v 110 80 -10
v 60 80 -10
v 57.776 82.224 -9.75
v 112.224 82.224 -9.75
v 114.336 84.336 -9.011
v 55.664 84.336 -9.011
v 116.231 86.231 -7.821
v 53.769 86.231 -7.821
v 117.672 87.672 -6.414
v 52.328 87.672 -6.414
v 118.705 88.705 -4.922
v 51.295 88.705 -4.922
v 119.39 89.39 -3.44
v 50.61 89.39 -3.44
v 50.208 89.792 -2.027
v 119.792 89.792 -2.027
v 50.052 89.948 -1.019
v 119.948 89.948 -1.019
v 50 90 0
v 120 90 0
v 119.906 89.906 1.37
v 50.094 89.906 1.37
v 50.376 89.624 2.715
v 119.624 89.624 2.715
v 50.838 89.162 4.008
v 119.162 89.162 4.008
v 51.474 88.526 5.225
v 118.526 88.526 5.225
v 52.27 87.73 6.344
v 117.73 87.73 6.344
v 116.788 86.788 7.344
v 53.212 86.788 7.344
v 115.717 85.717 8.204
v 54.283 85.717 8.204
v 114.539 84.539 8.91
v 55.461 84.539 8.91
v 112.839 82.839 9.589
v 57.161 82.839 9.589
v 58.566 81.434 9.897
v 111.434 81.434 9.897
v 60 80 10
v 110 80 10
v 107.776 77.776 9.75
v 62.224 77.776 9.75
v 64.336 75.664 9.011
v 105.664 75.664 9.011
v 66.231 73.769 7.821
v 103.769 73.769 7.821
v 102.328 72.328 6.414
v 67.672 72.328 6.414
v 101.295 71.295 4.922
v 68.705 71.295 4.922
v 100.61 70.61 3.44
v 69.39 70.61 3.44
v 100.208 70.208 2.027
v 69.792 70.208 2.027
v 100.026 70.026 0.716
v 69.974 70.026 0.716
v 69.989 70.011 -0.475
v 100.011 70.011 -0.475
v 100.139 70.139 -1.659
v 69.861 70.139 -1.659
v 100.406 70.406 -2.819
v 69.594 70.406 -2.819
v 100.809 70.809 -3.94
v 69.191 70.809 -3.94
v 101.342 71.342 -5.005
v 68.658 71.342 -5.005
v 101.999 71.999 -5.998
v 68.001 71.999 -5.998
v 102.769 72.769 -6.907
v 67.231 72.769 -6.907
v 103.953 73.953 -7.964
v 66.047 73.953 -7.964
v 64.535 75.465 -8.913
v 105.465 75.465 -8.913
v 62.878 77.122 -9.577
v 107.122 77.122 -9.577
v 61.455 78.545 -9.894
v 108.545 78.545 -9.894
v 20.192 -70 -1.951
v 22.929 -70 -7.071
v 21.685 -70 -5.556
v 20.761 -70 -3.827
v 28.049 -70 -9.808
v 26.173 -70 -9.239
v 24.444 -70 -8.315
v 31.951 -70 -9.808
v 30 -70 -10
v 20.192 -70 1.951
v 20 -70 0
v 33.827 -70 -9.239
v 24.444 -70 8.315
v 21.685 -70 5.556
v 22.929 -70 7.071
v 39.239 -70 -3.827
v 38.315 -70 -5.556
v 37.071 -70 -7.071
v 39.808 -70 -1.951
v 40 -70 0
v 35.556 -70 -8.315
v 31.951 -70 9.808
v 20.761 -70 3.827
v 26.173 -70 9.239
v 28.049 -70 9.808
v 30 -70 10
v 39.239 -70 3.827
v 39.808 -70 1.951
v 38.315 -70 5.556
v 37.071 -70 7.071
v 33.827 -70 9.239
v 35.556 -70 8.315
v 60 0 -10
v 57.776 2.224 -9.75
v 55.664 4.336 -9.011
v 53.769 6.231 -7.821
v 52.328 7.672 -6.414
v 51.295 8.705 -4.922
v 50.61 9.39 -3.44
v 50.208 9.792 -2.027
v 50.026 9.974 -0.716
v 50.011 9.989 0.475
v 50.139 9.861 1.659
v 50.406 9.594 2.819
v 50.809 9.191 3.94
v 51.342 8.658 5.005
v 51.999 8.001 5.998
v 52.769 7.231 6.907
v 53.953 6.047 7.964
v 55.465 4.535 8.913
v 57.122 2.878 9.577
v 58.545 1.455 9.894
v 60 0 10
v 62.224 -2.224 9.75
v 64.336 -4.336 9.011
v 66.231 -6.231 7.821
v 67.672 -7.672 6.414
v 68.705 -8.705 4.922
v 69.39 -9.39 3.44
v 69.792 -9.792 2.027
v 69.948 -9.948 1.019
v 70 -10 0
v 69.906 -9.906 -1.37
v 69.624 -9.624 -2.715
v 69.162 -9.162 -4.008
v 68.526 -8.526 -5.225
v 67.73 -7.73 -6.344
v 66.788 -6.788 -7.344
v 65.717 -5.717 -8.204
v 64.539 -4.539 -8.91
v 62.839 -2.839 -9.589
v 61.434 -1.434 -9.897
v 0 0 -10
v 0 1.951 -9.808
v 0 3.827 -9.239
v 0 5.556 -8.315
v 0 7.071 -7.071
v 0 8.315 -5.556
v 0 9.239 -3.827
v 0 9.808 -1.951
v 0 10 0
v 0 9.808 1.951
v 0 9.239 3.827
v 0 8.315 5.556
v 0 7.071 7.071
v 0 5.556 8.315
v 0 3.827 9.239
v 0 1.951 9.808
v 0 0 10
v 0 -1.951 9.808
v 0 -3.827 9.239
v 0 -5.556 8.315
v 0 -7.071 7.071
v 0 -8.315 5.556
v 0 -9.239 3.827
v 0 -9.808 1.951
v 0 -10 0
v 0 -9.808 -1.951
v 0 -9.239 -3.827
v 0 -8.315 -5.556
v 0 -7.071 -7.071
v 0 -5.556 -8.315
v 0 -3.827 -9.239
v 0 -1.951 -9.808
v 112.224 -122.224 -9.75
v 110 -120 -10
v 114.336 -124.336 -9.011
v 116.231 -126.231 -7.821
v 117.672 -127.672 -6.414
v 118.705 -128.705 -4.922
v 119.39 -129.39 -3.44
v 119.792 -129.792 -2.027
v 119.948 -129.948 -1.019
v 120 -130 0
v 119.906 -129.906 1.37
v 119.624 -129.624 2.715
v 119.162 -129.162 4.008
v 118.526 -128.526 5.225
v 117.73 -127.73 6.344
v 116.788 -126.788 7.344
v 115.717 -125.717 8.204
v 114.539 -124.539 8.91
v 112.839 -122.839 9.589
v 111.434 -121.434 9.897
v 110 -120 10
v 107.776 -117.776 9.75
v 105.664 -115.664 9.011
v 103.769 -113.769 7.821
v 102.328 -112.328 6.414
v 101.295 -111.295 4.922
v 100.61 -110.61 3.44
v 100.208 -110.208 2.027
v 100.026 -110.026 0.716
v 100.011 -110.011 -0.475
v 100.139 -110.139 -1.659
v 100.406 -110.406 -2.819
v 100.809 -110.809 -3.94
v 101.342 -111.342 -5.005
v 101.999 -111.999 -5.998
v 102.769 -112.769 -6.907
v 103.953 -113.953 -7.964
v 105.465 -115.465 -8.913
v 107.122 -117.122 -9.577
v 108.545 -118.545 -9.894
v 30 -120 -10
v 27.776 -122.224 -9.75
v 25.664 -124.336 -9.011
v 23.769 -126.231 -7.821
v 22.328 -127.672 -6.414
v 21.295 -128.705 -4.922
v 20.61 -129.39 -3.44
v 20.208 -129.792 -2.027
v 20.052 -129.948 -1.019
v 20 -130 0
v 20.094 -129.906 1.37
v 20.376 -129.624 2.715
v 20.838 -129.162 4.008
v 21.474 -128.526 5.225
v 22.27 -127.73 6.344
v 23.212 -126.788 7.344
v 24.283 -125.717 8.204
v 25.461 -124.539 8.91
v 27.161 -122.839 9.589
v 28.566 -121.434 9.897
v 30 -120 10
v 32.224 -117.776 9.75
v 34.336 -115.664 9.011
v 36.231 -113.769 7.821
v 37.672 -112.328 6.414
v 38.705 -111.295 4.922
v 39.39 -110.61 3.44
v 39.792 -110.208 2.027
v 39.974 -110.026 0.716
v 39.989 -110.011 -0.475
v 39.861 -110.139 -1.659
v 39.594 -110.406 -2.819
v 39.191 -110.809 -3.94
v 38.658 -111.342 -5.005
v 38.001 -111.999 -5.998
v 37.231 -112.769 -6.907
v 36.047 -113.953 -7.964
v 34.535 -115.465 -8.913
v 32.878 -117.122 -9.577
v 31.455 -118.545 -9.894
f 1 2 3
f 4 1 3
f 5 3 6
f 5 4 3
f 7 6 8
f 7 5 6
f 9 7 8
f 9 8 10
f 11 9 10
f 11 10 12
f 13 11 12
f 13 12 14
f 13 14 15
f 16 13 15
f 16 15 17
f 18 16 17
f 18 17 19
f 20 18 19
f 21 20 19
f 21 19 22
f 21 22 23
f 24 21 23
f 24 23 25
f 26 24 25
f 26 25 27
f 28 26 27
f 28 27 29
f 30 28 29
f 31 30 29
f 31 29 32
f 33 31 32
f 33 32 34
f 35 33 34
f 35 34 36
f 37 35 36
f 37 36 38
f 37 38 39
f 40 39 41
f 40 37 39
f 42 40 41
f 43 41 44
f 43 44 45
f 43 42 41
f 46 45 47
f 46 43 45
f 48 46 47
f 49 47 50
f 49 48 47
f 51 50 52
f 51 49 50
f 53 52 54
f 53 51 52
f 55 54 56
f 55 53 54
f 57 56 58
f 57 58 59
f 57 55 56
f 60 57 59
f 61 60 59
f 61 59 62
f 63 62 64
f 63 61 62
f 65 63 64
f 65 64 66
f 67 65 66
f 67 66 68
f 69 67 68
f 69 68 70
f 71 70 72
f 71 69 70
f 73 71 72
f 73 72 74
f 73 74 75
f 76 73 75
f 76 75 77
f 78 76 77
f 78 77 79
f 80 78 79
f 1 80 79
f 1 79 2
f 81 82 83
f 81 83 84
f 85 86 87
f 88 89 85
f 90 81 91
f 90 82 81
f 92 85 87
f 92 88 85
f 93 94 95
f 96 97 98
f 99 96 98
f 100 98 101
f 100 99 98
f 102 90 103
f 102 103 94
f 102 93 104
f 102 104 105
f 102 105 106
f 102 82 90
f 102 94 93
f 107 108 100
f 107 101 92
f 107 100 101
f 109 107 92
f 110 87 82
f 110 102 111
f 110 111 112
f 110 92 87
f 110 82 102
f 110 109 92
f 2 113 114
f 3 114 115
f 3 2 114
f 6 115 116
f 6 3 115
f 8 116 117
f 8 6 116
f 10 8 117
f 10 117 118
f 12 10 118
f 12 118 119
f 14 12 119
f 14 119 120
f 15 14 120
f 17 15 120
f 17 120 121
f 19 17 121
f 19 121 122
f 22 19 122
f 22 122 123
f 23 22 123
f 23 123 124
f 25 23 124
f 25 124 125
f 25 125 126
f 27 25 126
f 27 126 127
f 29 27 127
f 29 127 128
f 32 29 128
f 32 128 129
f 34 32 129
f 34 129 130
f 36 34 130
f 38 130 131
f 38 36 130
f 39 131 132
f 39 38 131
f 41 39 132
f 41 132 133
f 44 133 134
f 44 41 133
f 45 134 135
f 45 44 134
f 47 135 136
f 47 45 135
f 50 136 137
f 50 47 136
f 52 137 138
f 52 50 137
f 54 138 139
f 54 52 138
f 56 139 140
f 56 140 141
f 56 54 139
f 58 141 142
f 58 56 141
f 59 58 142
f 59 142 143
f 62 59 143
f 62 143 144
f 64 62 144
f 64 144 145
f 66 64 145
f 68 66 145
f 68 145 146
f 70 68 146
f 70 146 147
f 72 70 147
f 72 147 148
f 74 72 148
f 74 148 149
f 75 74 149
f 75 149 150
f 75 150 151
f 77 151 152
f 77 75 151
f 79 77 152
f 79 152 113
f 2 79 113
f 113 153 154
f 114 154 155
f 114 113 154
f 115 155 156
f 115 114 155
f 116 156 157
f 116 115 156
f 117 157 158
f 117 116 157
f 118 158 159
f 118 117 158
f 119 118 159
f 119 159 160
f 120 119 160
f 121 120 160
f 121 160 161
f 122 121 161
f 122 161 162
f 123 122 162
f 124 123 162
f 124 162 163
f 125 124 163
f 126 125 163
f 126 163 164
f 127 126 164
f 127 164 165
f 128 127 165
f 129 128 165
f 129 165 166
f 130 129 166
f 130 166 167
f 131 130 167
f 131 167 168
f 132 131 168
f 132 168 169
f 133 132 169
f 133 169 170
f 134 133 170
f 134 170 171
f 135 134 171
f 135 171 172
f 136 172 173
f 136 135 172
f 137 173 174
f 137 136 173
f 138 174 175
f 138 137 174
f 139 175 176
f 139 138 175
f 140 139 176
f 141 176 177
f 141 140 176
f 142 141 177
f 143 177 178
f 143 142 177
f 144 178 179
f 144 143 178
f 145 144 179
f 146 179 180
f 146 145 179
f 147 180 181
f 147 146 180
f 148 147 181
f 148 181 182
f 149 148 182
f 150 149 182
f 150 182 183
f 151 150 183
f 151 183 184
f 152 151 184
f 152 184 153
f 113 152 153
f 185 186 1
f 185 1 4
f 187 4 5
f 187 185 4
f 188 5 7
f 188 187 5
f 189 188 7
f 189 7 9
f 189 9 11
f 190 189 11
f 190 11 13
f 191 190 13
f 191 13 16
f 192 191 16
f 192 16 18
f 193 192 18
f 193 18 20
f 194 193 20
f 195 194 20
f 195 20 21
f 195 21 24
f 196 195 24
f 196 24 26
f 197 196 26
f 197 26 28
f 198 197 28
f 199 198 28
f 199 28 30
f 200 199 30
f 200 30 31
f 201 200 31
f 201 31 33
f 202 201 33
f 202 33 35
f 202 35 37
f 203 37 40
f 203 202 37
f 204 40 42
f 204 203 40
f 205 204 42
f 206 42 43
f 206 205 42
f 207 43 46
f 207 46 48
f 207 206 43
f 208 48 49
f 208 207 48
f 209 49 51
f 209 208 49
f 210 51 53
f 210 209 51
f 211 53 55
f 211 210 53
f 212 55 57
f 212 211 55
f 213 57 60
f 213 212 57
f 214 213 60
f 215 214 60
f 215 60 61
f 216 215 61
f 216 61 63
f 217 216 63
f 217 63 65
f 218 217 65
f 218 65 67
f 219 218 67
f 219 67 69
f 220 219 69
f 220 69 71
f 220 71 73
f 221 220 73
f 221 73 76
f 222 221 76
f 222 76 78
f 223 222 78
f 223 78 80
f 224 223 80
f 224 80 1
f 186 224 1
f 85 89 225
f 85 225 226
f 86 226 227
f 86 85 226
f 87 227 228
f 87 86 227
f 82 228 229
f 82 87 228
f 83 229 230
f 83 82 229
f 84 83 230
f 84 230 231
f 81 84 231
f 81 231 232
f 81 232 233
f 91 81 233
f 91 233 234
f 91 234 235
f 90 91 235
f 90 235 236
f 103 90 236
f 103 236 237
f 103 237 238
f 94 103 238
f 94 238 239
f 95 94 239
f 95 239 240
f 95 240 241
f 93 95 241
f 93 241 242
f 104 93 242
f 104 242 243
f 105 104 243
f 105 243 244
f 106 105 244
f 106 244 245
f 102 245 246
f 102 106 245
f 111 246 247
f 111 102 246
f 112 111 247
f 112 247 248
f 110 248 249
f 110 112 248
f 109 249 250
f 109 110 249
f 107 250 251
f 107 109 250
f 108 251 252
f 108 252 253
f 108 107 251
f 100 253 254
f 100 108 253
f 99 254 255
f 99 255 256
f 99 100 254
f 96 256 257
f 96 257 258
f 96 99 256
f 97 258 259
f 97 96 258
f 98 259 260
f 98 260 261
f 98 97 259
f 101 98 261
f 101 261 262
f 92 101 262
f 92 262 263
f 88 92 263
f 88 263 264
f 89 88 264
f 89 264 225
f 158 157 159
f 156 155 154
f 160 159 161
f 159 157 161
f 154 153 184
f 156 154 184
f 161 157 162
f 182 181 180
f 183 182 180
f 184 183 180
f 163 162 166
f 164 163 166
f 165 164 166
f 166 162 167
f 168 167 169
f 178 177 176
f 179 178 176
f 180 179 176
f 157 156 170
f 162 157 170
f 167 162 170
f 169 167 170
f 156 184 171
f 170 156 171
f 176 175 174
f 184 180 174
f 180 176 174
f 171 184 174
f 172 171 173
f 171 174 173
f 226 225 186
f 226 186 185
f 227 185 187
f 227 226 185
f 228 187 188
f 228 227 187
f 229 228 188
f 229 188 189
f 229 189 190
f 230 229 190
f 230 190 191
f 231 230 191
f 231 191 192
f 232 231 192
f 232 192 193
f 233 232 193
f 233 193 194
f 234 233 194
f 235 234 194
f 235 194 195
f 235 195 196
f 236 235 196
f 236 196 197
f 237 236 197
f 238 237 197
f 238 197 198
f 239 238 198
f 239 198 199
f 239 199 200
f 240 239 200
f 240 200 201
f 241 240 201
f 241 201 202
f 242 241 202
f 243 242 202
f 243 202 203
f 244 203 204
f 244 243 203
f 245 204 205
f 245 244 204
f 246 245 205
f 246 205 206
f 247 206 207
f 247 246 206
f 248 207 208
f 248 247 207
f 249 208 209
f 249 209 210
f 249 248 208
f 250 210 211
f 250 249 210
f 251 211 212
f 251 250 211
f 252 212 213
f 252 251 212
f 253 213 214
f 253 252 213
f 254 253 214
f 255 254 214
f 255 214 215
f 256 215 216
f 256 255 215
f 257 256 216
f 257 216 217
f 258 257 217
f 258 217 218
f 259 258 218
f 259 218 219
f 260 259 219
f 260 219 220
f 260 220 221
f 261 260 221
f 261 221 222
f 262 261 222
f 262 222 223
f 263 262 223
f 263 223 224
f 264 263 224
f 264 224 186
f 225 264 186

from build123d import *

# Parameters (mm, degrees)
SKETCH_2_R = 10


with BuildPart() as part:
    # 스윕1: sweep along a path in 스케치1
    with BuildLine(Plane.XY) as sweep_1_path:
        Line((0, 0), (60, 0))
        Line((60, 0), (60, 80))
        Line((60, 80), (110, 80))
        Line((110, 80), (110, -120))
        Line((110, -120), (30, -120))
        Line((30, -120), (30, -70))
    # 스케치2 → 스윕1 (sweep)
    with BuildSketch(Plane(origin=(0, 0, 0), x_dir=(0, 0, -1), z_dir=(1, 0, 0))):
        Circle(SKETCH_2_R)
    sweep(path=sweep_1_path.line, transition=Transition.RIGHT)


solid = part.part
